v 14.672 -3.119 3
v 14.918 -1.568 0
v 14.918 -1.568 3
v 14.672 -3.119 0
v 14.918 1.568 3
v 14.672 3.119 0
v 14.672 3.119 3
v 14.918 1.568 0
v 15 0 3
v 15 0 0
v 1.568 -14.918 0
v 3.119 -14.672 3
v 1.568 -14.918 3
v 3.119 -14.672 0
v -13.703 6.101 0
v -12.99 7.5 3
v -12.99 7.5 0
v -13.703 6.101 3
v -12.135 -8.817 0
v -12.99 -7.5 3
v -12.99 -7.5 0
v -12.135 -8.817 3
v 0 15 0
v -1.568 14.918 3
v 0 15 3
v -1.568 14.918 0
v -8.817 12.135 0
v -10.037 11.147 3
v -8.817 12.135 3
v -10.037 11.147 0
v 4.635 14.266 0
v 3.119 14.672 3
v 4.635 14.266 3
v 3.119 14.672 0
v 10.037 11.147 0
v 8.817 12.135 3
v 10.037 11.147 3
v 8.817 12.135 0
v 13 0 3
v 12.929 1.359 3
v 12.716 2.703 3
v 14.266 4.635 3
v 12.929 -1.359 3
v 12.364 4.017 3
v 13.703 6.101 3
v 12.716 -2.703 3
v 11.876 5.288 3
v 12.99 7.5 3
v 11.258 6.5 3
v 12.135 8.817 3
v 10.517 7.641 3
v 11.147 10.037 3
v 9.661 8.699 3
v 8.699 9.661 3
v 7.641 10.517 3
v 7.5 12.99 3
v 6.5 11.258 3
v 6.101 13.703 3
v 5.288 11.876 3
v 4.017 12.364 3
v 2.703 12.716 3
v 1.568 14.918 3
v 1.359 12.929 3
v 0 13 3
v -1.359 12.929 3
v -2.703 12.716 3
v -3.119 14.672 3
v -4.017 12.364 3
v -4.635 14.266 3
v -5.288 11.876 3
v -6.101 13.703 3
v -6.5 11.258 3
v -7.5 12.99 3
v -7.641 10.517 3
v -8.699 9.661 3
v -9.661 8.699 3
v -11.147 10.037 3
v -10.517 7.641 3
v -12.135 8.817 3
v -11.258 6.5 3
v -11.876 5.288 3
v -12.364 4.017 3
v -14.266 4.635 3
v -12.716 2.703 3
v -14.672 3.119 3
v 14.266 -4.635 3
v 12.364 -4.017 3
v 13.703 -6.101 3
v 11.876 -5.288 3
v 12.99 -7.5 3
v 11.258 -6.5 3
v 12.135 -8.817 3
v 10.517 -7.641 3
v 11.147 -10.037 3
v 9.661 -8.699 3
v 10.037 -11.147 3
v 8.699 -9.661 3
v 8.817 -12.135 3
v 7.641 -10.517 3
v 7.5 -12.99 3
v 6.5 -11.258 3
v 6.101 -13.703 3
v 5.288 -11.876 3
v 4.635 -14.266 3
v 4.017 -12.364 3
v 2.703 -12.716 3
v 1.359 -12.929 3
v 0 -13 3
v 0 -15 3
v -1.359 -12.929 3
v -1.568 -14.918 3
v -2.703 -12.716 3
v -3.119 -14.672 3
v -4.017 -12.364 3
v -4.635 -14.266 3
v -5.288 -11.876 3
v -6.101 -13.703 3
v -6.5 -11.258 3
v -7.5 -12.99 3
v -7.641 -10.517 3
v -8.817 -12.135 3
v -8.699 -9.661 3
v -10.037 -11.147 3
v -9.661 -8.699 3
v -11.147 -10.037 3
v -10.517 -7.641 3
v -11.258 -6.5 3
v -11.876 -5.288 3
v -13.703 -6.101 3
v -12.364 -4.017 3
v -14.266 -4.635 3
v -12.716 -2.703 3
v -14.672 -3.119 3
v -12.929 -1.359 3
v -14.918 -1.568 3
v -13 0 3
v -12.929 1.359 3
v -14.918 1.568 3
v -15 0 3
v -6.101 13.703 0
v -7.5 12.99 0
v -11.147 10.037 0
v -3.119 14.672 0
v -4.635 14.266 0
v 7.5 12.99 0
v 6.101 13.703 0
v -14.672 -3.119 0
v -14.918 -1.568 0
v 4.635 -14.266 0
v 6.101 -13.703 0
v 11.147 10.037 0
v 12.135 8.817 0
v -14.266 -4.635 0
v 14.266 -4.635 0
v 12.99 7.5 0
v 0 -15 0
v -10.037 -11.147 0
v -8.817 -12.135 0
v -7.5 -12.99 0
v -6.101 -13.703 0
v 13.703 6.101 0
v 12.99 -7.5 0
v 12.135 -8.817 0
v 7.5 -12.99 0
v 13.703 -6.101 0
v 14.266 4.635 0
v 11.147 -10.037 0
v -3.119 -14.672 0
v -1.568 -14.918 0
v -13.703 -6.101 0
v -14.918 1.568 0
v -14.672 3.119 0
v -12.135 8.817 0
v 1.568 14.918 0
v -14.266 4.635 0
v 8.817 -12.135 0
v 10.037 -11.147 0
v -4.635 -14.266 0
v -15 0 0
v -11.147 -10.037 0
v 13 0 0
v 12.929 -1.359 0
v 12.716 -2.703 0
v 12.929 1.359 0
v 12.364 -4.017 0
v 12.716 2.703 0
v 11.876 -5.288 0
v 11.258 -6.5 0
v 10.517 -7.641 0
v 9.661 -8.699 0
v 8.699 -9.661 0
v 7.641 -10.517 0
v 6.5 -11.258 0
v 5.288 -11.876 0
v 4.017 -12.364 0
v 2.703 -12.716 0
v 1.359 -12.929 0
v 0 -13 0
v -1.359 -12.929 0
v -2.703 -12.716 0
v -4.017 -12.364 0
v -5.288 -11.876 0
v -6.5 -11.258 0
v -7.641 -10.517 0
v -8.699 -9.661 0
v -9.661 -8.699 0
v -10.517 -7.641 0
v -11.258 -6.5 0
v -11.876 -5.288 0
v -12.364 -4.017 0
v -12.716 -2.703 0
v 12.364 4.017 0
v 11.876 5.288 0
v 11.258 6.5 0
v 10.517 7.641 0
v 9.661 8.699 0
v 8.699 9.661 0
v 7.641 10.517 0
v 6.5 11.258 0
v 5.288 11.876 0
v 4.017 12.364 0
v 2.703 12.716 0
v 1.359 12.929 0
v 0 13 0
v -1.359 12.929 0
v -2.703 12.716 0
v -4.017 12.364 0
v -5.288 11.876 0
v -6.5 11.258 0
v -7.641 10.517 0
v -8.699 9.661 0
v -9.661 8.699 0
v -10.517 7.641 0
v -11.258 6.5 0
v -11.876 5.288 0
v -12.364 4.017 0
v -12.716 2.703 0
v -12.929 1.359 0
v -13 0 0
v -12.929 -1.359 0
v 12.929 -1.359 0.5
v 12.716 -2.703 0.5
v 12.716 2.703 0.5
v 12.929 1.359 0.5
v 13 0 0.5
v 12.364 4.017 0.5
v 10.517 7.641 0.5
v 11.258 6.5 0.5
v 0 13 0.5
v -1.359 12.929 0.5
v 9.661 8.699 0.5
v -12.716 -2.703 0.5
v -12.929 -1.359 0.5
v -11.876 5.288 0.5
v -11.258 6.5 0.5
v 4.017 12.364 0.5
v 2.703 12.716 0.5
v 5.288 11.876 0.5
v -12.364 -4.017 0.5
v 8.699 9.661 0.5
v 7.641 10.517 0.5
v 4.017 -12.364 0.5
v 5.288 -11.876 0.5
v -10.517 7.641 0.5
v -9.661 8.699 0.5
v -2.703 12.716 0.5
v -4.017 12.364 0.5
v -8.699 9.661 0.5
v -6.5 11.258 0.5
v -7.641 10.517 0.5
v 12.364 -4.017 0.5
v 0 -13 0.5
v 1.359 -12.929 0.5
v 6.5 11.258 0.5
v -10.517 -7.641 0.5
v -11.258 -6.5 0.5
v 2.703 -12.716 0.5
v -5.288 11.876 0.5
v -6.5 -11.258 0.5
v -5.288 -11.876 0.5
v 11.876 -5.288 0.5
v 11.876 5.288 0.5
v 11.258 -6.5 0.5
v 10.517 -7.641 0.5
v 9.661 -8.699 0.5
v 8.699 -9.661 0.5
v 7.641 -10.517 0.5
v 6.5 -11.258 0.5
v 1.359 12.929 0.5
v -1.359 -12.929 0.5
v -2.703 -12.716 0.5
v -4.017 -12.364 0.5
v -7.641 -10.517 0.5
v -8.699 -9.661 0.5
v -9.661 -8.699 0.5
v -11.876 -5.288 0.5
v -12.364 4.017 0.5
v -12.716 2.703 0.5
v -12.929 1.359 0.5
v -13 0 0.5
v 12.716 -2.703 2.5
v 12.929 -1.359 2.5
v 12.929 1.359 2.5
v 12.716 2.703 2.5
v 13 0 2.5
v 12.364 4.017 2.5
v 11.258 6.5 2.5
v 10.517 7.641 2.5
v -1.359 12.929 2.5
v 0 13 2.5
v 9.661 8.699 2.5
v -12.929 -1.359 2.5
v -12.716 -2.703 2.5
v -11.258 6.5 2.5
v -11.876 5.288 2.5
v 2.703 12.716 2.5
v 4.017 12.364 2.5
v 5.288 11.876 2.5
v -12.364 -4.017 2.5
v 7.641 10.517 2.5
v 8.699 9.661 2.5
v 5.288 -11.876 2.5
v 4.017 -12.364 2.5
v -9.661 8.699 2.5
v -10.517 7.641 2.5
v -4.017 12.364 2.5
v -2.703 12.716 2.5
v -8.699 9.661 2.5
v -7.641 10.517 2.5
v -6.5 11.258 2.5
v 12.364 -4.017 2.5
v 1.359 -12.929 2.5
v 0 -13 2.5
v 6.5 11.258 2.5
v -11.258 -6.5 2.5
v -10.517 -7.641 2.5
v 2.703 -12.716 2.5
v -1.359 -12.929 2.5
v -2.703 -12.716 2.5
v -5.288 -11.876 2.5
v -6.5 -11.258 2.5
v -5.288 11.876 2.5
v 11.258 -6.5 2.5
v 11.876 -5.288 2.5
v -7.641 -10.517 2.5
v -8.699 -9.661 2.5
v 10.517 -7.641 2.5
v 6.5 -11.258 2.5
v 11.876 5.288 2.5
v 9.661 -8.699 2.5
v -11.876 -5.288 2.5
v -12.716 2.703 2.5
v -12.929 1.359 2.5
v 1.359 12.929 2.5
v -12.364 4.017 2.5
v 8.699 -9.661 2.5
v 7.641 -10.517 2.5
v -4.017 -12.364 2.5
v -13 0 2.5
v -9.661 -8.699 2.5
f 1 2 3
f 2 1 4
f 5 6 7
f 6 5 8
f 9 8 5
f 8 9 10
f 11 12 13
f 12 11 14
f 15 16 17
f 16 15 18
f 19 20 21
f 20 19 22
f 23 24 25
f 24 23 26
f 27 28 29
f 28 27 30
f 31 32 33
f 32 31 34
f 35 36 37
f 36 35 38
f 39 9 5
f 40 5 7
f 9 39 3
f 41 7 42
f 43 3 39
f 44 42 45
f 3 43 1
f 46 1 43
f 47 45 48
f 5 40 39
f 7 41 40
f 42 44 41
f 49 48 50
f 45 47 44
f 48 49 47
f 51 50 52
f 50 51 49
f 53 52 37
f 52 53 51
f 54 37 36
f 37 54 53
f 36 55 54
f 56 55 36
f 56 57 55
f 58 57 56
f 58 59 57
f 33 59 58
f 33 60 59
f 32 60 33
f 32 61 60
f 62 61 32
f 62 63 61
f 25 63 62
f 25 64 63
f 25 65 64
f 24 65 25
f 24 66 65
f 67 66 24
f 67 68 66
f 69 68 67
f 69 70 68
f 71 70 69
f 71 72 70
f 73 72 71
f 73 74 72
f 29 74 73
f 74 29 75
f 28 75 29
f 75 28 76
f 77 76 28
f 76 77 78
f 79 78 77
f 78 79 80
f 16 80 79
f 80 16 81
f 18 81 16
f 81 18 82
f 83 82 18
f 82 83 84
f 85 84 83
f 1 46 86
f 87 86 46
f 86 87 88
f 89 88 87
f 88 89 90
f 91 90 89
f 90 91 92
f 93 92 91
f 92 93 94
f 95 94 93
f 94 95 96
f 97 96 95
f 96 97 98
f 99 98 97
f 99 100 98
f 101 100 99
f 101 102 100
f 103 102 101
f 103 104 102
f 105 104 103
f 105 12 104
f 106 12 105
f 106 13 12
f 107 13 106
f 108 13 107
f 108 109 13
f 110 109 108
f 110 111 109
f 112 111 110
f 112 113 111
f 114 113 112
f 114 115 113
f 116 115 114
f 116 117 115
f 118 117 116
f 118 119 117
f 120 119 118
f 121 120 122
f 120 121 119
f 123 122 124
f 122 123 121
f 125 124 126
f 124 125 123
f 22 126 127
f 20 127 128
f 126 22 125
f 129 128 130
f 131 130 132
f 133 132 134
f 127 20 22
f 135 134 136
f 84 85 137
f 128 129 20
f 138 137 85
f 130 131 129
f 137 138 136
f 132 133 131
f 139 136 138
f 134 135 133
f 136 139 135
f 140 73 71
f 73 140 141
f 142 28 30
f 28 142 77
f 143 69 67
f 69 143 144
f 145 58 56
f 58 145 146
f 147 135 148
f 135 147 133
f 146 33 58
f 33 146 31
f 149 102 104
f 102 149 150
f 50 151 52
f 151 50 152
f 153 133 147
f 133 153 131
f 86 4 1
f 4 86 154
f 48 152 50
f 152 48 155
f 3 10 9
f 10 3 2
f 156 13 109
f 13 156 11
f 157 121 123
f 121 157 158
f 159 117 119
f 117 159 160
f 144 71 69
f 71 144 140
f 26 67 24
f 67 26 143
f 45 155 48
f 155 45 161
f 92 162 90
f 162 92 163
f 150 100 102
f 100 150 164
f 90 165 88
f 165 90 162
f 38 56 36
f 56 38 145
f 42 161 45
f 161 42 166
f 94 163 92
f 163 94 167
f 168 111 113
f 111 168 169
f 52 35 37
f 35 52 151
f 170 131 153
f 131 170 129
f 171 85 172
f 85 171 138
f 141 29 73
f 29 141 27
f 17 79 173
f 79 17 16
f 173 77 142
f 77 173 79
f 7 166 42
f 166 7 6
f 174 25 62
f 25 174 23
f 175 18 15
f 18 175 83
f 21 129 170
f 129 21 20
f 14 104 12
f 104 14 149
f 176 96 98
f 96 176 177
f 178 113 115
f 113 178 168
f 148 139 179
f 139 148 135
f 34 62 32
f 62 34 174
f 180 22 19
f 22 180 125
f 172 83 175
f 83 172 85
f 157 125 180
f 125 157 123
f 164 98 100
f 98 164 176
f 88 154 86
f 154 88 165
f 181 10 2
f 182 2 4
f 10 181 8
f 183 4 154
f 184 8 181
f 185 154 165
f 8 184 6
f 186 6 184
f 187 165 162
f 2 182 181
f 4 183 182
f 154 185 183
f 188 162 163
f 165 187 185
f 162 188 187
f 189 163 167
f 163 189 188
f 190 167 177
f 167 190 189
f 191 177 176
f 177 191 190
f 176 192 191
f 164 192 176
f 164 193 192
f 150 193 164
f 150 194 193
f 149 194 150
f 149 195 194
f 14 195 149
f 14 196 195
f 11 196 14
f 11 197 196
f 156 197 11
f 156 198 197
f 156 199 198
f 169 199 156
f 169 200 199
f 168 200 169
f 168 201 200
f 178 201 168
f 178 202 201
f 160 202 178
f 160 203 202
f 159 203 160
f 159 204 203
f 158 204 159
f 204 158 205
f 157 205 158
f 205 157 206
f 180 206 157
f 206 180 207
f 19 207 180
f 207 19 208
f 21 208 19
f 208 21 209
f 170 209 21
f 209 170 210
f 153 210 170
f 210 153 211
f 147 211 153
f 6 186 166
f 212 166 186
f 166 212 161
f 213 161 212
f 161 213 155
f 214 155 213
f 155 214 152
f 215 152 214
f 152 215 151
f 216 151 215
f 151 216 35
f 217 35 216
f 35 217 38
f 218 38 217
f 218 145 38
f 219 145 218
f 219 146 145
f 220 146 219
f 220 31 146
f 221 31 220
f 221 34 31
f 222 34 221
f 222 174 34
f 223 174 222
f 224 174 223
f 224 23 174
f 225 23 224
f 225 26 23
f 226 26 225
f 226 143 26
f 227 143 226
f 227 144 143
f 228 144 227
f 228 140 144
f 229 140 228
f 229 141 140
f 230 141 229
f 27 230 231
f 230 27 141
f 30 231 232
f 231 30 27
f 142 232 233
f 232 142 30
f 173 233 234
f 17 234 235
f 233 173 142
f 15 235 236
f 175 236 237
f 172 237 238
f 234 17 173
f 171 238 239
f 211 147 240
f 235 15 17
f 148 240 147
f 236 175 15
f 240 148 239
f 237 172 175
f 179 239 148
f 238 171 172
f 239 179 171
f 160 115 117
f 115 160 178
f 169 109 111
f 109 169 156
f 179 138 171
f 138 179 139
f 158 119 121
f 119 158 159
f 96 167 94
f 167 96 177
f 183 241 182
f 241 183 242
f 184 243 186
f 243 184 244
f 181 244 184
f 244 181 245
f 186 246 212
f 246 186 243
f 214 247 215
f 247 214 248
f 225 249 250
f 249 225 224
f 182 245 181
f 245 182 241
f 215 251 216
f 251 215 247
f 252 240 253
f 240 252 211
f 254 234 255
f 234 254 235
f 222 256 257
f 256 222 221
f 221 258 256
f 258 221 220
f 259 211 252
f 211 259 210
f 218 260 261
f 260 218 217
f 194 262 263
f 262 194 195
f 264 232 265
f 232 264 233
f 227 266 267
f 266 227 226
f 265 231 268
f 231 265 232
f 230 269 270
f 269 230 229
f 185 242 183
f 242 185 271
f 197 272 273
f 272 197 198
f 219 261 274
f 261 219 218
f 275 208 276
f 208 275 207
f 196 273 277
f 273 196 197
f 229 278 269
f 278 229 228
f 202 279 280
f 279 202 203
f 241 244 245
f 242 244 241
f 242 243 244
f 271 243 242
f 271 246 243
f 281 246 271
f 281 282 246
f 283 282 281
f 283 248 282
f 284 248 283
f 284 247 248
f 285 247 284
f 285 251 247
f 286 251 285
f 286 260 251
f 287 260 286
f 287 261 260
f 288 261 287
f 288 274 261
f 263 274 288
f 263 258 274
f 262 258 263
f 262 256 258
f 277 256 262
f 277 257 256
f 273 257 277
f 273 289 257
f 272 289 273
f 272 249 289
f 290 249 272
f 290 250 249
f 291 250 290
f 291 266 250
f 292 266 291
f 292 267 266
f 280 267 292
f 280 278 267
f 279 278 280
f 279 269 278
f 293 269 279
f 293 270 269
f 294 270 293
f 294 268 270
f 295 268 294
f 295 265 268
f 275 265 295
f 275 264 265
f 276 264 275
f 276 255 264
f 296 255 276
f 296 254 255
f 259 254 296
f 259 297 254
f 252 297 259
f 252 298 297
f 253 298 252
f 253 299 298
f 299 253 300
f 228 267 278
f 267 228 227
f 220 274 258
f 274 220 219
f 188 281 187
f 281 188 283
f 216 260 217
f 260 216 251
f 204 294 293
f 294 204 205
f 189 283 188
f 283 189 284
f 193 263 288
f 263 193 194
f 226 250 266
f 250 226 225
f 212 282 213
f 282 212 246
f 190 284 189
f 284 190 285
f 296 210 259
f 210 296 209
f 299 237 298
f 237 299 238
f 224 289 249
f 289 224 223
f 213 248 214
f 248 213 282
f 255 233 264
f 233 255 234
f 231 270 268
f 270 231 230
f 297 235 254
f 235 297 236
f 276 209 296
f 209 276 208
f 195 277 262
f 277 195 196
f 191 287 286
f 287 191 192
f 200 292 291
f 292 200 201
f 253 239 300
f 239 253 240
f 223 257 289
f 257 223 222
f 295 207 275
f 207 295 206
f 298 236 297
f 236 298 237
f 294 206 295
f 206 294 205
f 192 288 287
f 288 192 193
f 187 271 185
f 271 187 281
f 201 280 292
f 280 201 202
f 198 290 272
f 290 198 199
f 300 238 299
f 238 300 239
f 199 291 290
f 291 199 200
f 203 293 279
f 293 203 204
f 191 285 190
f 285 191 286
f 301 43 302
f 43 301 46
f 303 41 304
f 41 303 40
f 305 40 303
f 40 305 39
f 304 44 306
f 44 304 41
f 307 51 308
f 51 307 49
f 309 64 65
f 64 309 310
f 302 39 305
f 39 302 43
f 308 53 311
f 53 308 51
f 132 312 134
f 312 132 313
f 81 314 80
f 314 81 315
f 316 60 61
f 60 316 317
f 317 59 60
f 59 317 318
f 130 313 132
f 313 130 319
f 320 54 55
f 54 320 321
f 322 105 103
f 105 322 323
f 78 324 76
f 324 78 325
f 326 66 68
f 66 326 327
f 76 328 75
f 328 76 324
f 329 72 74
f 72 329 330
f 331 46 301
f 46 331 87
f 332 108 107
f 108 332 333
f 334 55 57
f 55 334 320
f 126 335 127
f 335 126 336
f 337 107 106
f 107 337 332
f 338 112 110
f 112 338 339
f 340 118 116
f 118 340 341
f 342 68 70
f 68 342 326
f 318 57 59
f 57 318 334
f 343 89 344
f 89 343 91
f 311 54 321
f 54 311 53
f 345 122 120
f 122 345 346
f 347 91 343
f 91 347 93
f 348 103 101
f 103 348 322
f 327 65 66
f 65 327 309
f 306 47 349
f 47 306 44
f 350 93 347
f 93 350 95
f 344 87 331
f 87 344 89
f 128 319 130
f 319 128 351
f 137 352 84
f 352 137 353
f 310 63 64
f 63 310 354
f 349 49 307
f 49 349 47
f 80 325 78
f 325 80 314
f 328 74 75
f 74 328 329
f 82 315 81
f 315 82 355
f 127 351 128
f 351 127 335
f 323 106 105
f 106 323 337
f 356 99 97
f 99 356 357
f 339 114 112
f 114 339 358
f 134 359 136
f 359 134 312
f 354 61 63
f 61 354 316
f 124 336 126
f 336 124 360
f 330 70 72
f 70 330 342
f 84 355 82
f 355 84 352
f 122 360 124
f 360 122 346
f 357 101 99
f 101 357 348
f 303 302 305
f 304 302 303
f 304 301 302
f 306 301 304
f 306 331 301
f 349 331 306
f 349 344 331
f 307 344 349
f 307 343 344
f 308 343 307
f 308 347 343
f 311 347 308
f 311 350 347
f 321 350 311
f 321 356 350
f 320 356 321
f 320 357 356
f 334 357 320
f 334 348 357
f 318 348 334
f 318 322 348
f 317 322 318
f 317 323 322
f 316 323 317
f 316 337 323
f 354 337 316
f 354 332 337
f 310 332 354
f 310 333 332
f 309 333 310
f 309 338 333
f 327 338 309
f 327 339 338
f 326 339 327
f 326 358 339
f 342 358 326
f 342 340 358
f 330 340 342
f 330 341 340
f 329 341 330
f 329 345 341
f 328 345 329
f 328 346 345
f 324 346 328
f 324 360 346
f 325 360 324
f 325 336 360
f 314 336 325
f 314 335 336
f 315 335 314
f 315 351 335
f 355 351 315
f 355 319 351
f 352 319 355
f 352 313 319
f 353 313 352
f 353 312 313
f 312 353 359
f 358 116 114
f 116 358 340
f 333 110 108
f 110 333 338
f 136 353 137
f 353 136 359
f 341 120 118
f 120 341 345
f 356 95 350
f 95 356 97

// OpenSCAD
module token_empty(diameter_mm=30, thickness_mm=3, ridge_width_mm=2, ridge_depth_mm=0.5) {
    $fn=60;
    difference() {
        cylinder(r=diameter_mm/2, h=thickness_mm);
        translate([0,0,-ridge_depth_mm]) {
            cylinder(r=diameter_mm/2-ridge_width_mm, h=2*ridge_depth_mm);
        }
        cylinder(r=diameter_mm/2-ridge_width_mm, h=ridge_depth_mm);
        translate([0,0,thickness_mm-ridge_depth_mm]) {
            cylinder(r=diameter_mm/2-ridge_width_mm, h=2-ridge_depth_mm);
        }
    }
}

token_empty();
